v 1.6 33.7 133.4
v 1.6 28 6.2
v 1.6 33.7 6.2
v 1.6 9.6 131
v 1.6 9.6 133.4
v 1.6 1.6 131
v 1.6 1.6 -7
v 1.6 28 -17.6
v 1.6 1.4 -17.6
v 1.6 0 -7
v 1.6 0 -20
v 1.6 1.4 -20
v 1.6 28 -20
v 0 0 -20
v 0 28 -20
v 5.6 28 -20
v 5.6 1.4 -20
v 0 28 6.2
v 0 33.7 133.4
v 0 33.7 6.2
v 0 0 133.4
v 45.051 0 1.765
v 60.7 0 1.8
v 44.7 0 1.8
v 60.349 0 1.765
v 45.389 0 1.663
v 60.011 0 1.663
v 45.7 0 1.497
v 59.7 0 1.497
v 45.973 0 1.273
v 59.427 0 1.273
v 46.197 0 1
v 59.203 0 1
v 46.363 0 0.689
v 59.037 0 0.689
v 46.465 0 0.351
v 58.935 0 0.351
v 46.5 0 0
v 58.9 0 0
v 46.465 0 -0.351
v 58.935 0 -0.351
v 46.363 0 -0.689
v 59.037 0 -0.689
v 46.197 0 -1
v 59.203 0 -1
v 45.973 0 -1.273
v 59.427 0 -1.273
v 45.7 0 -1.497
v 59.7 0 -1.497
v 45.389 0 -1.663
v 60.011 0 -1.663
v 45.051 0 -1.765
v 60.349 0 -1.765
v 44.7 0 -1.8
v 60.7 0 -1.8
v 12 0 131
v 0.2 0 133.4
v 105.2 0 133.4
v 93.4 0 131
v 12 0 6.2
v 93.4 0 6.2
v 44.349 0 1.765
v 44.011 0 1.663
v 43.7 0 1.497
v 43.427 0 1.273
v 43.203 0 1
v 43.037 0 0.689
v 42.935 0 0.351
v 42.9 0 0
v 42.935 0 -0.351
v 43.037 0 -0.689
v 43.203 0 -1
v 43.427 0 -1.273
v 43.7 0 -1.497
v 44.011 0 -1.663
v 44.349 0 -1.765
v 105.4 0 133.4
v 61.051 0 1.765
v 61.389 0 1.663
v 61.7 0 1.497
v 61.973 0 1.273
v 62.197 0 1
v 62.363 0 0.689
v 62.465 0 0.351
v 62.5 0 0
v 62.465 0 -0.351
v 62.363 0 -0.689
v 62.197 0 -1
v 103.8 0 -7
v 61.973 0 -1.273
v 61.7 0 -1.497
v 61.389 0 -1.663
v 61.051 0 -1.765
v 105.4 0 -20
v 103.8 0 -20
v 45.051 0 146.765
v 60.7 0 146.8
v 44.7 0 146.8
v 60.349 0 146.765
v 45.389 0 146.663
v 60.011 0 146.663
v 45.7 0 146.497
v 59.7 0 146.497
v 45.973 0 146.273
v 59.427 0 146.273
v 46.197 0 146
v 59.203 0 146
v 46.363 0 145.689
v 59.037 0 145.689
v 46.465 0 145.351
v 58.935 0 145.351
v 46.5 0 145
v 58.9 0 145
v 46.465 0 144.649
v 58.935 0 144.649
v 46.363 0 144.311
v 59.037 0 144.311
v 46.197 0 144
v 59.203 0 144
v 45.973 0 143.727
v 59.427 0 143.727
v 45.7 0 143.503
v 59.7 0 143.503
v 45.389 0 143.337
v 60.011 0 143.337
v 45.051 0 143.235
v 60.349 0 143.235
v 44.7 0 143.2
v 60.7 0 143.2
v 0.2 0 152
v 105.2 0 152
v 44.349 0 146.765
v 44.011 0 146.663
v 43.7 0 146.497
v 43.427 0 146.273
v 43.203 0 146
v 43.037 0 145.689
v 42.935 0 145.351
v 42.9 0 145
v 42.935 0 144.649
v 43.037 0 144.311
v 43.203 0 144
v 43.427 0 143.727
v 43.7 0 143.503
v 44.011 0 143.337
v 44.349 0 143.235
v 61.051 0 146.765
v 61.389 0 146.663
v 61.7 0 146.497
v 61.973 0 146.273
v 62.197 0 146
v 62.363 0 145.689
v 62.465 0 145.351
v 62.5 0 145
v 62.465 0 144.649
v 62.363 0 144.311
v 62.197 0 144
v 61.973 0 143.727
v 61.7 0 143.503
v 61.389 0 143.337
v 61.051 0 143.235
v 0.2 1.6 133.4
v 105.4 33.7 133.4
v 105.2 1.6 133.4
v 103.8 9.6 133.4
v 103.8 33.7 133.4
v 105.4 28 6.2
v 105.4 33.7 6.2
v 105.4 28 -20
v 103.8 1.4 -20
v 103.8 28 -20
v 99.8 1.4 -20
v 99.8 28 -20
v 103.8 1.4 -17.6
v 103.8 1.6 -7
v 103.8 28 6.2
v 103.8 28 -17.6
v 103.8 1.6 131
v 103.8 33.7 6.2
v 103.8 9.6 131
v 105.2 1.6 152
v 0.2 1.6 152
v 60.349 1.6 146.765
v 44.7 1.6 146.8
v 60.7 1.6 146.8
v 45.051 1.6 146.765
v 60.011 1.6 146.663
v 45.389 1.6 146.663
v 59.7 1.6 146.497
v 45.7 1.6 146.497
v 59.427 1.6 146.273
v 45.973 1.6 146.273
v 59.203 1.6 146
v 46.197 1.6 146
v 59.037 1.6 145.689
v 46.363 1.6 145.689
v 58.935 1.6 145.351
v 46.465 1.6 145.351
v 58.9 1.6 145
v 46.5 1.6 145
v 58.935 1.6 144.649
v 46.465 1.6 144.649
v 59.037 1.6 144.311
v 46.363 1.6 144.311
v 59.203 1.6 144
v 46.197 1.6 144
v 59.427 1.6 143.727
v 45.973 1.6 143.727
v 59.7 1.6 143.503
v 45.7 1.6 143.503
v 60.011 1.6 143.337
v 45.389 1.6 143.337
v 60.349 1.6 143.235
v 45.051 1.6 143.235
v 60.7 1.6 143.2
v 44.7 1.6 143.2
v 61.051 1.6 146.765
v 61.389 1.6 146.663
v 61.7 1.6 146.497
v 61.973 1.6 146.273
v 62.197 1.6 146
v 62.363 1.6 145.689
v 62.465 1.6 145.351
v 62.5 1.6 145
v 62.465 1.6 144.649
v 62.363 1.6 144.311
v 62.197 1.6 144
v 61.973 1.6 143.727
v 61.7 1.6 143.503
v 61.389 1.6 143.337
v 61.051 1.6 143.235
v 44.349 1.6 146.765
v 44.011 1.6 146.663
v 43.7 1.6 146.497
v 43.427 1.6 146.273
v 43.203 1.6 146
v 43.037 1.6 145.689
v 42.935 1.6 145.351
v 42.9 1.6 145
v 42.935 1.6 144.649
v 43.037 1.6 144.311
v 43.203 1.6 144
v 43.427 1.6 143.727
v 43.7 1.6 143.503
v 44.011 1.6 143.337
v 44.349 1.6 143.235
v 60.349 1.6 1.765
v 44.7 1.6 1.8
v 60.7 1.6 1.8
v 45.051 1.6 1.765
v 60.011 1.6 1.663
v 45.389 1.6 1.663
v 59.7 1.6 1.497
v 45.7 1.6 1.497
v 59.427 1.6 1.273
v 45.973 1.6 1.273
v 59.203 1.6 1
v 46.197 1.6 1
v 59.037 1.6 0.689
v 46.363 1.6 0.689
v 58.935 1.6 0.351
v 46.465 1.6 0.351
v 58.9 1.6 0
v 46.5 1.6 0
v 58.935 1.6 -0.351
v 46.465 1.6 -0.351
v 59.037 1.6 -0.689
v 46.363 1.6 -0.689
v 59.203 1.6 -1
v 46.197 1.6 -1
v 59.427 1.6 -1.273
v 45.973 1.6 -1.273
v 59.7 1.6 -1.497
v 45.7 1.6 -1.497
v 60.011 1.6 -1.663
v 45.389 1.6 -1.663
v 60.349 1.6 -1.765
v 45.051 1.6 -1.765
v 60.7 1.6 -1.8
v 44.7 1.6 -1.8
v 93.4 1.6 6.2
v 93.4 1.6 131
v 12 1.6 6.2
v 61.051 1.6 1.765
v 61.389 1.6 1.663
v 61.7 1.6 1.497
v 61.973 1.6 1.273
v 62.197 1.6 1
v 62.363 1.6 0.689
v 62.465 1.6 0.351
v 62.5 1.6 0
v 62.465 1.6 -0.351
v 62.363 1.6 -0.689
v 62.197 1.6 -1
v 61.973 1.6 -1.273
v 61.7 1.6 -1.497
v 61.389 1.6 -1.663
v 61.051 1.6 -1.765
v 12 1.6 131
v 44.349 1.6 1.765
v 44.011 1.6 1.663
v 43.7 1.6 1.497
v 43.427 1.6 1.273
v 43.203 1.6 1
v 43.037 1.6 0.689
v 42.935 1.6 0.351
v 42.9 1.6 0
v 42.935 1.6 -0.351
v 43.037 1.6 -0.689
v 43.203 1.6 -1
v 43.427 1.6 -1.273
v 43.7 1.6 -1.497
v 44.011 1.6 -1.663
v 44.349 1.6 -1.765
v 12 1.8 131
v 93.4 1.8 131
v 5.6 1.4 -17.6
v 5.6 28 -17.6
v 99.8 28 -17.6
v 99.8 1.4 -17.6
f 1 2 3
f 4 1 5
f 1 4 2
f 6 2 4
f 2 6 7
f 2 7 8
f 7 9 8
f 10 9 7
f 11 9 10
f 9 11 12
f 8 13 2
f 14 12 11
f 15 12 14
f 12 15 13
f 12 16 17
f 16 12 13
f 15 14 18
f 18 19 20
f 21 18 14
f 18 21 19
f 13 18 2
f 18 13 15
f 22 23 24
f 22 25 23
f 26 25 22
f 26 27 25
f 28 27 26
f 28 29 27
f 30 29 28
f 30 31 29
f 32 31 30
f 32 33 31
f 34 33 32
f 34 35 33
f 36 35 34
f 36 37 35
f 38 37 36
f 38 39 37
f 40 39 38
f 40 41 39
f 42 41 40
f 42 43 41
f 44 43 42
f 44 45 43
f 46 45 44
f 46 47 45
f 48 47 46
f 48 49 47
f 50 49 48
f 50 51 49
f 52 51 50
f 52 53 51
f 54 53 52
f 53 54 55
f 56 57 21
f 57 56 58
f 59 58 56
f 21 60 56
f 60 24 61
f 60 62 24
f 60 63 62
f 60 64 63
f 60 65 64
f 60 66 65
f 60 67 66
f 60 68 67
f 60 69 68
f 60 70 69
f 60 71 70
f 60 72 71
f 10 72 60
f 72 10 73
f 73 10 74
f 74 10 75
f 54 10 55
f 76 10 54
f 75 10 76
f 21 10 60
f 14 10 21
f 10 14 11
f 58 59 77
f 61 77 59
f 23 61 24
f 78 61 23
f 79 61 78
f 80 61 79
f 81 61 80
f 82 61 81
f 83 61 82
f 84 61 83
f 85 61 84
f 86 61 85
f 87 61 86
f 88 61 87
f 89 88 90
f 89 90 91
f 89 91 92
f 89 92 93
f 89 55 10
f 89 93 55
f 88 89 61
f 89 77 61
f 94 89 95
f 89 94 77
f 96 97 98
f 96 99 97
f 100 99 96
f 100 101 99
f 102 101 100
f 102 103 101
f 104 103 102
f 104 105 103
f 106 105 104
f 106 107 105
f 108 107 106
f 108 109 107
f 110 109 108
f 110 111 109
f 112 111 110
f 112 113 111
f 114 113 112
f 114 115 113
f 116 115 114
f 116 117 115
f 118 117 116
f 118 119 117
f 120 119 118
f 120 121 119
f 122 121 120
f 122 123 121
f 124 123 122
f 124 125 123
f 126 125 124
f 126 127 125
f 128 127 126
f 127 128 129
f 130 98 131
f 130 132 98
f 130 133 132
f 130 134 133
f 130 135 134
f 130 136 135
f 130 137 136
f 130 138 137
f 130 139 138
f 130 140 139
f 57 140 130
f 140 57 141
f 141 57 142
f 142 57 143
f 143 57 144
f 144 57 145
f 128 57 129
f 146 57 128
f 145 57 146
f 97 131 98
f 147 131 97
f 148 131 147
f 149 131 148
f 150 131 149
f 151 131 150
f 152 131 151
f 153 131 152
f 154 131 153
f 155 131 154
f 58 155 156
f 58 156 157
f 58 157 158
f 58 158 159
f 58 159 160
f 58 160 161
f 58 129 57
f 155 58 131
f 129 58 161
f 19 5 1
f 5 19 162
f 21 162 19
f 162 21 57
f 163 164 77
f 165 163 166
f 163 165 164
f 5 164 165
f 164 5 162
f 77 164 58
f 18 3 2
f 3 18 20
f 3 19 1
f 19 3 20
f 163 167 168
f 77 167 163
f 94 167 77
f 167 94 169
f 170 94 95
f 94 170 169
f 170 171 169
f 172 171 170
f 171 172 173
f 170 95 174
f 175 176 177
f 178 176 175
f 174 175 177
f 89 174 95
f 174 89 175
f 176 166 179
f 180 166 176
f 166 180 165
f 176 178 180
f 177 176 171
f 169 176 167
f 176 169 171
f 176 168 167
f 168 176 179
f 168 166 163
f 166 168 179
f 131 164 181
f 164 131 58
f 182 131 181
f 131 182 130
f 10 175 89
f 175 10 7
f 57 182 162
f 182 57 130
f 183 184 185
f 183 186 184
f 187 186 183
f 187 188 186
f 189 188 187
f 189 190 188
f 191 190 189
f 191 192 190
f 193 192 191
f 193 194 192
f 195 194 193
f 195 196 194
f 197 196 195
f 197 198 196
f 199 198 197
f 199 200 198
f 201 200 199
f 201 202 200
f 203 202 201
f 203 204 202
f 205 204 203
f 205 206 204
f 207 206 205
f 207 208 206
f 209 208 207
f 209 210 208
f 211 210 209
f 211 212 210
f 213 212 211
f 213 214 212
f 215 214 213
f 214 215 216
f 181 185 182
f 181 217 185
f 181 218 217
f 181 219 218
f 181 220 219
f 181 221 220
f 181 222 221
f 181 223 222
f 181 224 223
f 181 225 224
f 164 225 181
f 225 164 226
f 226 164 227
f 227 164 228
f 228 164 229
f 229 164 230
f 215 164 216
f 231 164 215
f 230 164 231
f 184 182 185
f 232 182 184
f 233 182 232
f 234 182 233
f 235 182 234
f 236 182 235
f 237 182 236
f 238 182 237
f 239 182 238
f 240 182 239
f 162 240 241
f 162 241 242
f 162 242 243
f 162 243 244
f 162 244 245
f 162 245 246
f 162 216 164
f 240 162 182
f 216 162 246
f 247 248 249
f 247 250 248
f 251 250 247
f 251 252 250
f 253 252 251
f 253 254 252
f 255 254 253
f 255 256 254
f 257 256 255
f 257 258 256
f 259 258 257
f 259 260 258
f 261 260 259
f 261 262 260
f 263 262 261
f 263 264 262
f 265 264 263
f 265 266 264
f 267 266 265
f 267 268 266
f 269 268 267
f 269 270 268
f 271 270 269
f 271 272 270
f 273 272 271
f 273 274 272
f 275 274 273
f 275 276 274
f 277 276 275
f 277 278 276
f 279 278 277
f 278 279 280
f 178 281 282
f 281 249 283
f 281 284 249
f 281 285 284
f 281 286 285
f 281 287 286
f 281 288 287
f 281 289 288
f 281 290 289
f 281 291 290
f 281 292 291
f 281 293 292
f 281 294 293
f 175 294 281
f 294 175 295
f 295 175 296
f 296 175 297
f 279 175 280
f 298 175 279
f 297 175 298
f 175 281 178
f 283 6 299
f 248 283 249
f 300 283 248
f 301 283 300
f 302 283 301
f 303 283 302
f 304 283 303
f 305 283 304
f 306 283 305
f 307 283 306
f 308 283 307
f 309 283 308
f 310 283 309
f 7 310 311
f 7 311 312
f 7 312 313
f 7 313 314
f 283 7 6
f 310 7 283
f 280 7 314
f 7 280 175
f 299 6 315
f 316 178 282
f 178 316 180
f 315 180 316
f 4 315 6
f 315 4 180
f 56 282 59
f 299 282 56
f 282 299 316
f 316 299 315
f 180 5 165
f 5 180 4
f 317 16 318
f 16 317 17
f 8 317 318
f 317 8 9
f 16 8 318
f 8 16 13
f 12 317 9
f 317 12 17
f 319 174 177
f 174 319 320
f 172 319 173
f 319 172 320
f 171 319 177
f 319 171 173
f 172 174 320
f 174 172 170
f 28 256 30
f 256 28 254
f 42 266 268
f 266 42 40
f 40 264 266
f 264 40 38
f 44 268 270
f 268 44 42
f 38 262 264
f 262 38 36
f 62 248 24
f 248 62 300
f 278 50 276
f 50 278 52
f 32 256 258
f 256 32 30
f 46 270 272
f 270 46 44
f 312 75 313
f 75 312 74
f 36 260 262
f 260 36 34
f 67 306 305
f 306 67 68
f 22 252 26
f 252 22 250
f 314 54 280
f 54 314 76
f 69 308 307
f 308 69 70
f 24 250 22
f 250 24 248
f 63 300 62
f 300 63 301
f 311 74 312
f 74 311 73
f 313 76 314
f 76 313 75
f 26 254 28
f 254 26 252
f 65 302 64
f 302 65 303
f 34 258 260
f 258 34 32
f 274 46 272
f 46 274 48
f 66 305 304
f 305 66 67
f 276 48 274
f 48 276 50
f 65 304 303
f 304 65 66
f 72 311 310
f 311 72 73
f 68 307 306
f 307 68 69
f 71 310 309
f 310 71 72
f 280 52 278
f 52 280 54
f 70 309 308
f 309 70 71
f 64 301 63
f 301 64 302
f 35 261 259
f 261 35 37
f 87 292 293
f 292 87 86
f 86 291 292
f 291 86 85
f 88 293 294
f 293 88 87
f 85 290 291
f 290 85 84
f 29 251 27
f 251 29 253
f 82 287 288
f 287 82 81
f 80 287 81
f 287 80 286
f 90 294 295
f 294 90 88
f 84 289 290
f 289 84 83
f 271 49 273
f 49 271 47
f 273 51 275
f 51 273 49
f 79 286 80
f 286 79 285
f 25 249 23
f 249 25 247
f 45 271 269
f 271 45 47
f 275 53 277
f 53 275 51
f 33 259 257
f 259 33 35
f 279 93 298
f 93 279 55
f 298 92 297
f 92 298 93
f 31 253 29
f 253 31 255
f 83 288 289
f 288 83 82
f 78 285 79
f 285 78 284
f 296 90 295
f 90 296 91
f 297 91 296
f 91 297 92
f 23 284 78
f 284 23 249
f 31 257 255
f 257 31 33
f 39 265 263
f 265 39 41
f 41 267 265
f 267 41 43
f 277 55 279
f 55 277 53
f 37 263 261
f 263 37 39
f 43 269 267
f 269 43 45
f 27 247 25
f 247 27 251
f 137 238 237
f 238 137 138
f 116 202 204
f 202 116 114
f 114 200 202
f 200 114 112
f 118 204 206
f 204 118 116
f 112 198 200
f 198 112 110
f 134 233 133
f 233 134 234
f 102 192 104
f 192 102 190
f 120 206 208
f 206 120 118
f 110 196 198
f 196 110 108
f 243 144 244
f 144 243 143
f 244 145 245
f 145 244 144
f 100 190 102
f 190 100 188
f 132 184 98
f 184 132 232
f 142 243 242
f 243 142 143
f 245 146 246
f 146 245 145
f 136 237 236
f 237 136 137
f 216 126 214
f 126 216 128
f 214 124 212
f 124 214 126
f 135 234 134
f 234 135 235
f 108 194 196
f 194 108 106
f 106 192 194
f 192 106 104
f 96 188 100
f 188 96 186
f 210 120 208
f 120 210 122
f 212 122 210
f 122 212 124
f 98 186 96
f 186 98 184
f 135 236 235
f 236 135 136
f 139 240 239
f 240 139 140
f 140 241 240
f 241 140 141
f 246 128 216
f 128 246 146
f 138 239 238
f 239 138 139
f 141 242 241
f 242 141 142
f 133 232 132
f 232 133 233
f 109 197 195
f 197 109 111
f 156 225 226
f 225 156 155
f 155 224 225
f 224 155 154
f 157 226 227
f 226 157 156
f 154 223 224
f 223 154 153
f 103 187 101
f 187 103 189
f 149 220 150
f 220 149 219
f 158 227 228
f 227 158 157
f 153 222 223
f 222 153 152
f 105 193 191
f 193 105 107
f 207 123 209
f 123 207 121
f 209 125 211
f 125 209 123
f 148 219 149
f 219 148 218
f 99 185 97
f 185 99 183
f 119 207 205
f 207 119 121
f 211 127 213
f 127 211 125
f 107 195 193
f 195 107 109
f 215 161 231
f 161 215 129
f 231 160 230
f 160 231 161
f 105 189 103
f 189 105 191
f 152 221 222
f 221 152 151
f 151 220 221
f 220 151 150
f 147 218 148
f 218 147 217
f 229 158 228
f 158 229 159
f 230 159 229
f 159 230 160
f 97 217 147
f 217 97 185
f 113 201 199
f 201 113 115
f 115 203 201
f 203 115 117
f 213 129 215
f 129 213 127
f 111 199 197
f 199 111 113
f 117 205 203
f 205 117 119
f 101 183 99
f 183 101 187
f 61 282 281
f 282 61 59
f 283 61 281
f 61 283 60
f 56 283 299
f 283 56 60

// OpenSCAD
// file: params.scad
// Общие размеры первой итерации: один отсек 3.5" и детали вокруг него.
// Корпус диска — SFF-8301, таблица 3-1, класс высоты 26.10 мм (максимум).
// Положение разъёма SATA сюда не зашито: его снимают калибром gauge.scad
// с конкретного диска и только потом переносят в окно салазок.

drive_width = 101.60;
drive_height = 26.10;
drive_length = 147.00;

wall = 4.0;
floor_t = 4.0;
lip_t = 3.0;
nib = 4.0;
side_clearance = 0.8;
top_clearance = 1.5;

front_gap = 3.0;
plate_t = 8.0;
front_extra = front_gap + plate_t;

pusher_d = 4.4;
m3_clear = 3.4;
m3_pilot = 2.6;
m3_nut_af = 5.5;
m3_nut_t = 2.8;

cavity_w = drive_width + side_clearance;
outer_w = cavity_w + 2 * wall;
wall_h = drive_height + top_clearance;
body_z = drive_length + front_extra;

strap_z = 18;
strap_t = 4.0;
strap_foot = 14.0;

plate_screw_x = [14, drive_width - 14];
plate_z0 = drive_length + front_gap;
plate_screw_z = plate_z0 + plate_t / 2;
plate_bar_h = 10;
tower_w = 28;
tower_x = drive_width / 2 - tower_w / 2;

sled_w = 78;
sled_h = 48;
sled_t = 8;
sled_window_w = 50;
sled_window_h = 18;
sled_hole_inset = 6;

// Каркас 1U. Шаг EIA — 44.45 мм, уголок 44.0 мм, чтобы соседний юнит не тёрся.
// Гнездо 8.4 мм принимает трубку до 8 мм. Хомут тянет её к внешней стенке гнезда.
// При rod_d = 6 между трубками 29 мм: пол корзины 1.6 мм, диск 26.1 мм, воздух ~1 мм.
// При 8 мм диск 26.1 мм в этот юнит уже не входит.
unit_h = 44.0;
rod_d = 6;
socket_d = 8.4;
// 10 мм хватает, чтобы трубка села и хомут её зажал. Столбик тогда 12 мм,
// и четыре корзины остаются внутри просвета 450 мм.
socket_depth = 10;
socket_wall = 1.6;
skin = 0.8;
foot = 1.6;
roof = 1.4;
tie_w = 3.2;
// Просвет между направляющими стойки 19 дюймов — 450 мм.
opening_w = 450;
bay_count = 4;
bay_gap = 1.0;
basket_wall = 1.6;
basket_clear = 0.6;
rail_t = 1.6;
// Торец разъёма выступает за ближнюю трубку к каретке, чтобы трубка не перекрыла SATA.
plug_overhang = 16;
stop_margin = 14;

socket_r = socket_d / 2;
post_x = socket_depth + 2;
axis_inset = skin + socket_r;
bottom_axis_y = foot + socket_r;
top_axis_y = unit_h - roof - socket_r;
depth_z0 = axis_inset + socket_r + socket_wall;
post_z = depth_z0 + socket_depth;
basket_w = drive_width + basket_clear + 2 * basket_wall;
inner_w = bay_count * basket_w + (bay_count - 1) * bay_gap;
frame_w = inner_w + 2 * post_x;
rod_span = drive_length - plug_overhang + stop_margin;
frame_depth = rod_span + 2 * axis_inset;
rod_y0 = foot + rod_d / 2;
rod_y1 = unit_h - roof - rod_d / 2;
rod_gap = (rod_y1 - rod_d / 2) - (rod_y0 + rod_d / 2);

// KW11-3Z: корпус около 19.8 x 10.2 x 6.4 мм, два отверстия 2.35–2.5 мм
// с шагом 9.5 мм под винты M2.
switch_hole_d = 2.5;
switch_pitch = 9.5;

$fn = 32;
// main file
// Корзина-лоток на две нижние поперечные трубки.
// Печатать полом вниз, без поддержек. К трубкам крепится хомутами.
// z = 0 — ось трубки со стороны каретки.
// z = rod_span — ось дальней трубки. Упор диска стоит перед ней.
// Торец разъёма выступает на plug_overhang к каретке, нижняя трубка его не закрывает.
include <params.scad>

tab_extra = rod_d / 2 + 4;
tie_hole = 3.6;
tie_spread = 16;
lip_h = 8;
lip_t = 2.4;
cheek = 4;
rail_w = 12;

module basket() {
    short_h = rod_gap - 1.0;
    tall_h = min(
        rail_t + drive_height + 6,
        unit_h - (rod_y0 + rod_d / 2) - 1
    );
    z_drive0 = -plug_overhang;
    z_wall0 = z_drive0 - 4;
    z_lip = z_drive0 + drive_length;
    notch = socket_d / 2 + 2;
    z0 = -tab_extra;
    z1 = rod_span + tab_extra;

    difference() {
        union() {
            // Пол чуть уже бортов, борта в него утоплены. Так нет общей грани.
            translate([0.2, 0, z0])
                cube([basket_w - 0.4, rail_t, z1 - z0]);

            for (x = [0, basket_w - basket_wall]) {
                translate([x, 0, z_wall0])
                    cube([basket_wall, short_h, z_lip - z_wall0]);
                translate([x, 0, notch])
                    cube([basket_wall, tall_h, (z_lip - notch) + lip_t]);
            }

            translate([basket_wall, rail_t - 0.2, z_lip])
                cube([basket_w - 2 * basket_wall, lip_h + 0.2, lip_t]);

            translate([basket_wall, rail_t - 0.2, z_wall0])
                cube([cheek, short_h - rail_t + 0.2, 2.4]);
            translate([basket_w - basket_wall - cheek, rail_t - 0.2, z_wall0])
                cube([cheek, short_h - rail_t + 0.2, 2.4]);
        }

        // Окно в полу: по краям остаются рейки, по торцам — ушки под хомут.
        translate([rail_w, -0.2, notch])
            cube([basket_w - 2 * rail_w, rail_t + 0.4, z_lip - notch]);

        for (z = [0, rod_span]) {
            for (x = [-tie_spread / 2, tie_spread / 2]) {
                translate([basket_w / 2 + x, -0.2, z])
                    rotate([-90, 0, 0])
                        cylinder(h = rail_t + 0.4, d = tie_hole);
            }
        }
    }
}

basket();
